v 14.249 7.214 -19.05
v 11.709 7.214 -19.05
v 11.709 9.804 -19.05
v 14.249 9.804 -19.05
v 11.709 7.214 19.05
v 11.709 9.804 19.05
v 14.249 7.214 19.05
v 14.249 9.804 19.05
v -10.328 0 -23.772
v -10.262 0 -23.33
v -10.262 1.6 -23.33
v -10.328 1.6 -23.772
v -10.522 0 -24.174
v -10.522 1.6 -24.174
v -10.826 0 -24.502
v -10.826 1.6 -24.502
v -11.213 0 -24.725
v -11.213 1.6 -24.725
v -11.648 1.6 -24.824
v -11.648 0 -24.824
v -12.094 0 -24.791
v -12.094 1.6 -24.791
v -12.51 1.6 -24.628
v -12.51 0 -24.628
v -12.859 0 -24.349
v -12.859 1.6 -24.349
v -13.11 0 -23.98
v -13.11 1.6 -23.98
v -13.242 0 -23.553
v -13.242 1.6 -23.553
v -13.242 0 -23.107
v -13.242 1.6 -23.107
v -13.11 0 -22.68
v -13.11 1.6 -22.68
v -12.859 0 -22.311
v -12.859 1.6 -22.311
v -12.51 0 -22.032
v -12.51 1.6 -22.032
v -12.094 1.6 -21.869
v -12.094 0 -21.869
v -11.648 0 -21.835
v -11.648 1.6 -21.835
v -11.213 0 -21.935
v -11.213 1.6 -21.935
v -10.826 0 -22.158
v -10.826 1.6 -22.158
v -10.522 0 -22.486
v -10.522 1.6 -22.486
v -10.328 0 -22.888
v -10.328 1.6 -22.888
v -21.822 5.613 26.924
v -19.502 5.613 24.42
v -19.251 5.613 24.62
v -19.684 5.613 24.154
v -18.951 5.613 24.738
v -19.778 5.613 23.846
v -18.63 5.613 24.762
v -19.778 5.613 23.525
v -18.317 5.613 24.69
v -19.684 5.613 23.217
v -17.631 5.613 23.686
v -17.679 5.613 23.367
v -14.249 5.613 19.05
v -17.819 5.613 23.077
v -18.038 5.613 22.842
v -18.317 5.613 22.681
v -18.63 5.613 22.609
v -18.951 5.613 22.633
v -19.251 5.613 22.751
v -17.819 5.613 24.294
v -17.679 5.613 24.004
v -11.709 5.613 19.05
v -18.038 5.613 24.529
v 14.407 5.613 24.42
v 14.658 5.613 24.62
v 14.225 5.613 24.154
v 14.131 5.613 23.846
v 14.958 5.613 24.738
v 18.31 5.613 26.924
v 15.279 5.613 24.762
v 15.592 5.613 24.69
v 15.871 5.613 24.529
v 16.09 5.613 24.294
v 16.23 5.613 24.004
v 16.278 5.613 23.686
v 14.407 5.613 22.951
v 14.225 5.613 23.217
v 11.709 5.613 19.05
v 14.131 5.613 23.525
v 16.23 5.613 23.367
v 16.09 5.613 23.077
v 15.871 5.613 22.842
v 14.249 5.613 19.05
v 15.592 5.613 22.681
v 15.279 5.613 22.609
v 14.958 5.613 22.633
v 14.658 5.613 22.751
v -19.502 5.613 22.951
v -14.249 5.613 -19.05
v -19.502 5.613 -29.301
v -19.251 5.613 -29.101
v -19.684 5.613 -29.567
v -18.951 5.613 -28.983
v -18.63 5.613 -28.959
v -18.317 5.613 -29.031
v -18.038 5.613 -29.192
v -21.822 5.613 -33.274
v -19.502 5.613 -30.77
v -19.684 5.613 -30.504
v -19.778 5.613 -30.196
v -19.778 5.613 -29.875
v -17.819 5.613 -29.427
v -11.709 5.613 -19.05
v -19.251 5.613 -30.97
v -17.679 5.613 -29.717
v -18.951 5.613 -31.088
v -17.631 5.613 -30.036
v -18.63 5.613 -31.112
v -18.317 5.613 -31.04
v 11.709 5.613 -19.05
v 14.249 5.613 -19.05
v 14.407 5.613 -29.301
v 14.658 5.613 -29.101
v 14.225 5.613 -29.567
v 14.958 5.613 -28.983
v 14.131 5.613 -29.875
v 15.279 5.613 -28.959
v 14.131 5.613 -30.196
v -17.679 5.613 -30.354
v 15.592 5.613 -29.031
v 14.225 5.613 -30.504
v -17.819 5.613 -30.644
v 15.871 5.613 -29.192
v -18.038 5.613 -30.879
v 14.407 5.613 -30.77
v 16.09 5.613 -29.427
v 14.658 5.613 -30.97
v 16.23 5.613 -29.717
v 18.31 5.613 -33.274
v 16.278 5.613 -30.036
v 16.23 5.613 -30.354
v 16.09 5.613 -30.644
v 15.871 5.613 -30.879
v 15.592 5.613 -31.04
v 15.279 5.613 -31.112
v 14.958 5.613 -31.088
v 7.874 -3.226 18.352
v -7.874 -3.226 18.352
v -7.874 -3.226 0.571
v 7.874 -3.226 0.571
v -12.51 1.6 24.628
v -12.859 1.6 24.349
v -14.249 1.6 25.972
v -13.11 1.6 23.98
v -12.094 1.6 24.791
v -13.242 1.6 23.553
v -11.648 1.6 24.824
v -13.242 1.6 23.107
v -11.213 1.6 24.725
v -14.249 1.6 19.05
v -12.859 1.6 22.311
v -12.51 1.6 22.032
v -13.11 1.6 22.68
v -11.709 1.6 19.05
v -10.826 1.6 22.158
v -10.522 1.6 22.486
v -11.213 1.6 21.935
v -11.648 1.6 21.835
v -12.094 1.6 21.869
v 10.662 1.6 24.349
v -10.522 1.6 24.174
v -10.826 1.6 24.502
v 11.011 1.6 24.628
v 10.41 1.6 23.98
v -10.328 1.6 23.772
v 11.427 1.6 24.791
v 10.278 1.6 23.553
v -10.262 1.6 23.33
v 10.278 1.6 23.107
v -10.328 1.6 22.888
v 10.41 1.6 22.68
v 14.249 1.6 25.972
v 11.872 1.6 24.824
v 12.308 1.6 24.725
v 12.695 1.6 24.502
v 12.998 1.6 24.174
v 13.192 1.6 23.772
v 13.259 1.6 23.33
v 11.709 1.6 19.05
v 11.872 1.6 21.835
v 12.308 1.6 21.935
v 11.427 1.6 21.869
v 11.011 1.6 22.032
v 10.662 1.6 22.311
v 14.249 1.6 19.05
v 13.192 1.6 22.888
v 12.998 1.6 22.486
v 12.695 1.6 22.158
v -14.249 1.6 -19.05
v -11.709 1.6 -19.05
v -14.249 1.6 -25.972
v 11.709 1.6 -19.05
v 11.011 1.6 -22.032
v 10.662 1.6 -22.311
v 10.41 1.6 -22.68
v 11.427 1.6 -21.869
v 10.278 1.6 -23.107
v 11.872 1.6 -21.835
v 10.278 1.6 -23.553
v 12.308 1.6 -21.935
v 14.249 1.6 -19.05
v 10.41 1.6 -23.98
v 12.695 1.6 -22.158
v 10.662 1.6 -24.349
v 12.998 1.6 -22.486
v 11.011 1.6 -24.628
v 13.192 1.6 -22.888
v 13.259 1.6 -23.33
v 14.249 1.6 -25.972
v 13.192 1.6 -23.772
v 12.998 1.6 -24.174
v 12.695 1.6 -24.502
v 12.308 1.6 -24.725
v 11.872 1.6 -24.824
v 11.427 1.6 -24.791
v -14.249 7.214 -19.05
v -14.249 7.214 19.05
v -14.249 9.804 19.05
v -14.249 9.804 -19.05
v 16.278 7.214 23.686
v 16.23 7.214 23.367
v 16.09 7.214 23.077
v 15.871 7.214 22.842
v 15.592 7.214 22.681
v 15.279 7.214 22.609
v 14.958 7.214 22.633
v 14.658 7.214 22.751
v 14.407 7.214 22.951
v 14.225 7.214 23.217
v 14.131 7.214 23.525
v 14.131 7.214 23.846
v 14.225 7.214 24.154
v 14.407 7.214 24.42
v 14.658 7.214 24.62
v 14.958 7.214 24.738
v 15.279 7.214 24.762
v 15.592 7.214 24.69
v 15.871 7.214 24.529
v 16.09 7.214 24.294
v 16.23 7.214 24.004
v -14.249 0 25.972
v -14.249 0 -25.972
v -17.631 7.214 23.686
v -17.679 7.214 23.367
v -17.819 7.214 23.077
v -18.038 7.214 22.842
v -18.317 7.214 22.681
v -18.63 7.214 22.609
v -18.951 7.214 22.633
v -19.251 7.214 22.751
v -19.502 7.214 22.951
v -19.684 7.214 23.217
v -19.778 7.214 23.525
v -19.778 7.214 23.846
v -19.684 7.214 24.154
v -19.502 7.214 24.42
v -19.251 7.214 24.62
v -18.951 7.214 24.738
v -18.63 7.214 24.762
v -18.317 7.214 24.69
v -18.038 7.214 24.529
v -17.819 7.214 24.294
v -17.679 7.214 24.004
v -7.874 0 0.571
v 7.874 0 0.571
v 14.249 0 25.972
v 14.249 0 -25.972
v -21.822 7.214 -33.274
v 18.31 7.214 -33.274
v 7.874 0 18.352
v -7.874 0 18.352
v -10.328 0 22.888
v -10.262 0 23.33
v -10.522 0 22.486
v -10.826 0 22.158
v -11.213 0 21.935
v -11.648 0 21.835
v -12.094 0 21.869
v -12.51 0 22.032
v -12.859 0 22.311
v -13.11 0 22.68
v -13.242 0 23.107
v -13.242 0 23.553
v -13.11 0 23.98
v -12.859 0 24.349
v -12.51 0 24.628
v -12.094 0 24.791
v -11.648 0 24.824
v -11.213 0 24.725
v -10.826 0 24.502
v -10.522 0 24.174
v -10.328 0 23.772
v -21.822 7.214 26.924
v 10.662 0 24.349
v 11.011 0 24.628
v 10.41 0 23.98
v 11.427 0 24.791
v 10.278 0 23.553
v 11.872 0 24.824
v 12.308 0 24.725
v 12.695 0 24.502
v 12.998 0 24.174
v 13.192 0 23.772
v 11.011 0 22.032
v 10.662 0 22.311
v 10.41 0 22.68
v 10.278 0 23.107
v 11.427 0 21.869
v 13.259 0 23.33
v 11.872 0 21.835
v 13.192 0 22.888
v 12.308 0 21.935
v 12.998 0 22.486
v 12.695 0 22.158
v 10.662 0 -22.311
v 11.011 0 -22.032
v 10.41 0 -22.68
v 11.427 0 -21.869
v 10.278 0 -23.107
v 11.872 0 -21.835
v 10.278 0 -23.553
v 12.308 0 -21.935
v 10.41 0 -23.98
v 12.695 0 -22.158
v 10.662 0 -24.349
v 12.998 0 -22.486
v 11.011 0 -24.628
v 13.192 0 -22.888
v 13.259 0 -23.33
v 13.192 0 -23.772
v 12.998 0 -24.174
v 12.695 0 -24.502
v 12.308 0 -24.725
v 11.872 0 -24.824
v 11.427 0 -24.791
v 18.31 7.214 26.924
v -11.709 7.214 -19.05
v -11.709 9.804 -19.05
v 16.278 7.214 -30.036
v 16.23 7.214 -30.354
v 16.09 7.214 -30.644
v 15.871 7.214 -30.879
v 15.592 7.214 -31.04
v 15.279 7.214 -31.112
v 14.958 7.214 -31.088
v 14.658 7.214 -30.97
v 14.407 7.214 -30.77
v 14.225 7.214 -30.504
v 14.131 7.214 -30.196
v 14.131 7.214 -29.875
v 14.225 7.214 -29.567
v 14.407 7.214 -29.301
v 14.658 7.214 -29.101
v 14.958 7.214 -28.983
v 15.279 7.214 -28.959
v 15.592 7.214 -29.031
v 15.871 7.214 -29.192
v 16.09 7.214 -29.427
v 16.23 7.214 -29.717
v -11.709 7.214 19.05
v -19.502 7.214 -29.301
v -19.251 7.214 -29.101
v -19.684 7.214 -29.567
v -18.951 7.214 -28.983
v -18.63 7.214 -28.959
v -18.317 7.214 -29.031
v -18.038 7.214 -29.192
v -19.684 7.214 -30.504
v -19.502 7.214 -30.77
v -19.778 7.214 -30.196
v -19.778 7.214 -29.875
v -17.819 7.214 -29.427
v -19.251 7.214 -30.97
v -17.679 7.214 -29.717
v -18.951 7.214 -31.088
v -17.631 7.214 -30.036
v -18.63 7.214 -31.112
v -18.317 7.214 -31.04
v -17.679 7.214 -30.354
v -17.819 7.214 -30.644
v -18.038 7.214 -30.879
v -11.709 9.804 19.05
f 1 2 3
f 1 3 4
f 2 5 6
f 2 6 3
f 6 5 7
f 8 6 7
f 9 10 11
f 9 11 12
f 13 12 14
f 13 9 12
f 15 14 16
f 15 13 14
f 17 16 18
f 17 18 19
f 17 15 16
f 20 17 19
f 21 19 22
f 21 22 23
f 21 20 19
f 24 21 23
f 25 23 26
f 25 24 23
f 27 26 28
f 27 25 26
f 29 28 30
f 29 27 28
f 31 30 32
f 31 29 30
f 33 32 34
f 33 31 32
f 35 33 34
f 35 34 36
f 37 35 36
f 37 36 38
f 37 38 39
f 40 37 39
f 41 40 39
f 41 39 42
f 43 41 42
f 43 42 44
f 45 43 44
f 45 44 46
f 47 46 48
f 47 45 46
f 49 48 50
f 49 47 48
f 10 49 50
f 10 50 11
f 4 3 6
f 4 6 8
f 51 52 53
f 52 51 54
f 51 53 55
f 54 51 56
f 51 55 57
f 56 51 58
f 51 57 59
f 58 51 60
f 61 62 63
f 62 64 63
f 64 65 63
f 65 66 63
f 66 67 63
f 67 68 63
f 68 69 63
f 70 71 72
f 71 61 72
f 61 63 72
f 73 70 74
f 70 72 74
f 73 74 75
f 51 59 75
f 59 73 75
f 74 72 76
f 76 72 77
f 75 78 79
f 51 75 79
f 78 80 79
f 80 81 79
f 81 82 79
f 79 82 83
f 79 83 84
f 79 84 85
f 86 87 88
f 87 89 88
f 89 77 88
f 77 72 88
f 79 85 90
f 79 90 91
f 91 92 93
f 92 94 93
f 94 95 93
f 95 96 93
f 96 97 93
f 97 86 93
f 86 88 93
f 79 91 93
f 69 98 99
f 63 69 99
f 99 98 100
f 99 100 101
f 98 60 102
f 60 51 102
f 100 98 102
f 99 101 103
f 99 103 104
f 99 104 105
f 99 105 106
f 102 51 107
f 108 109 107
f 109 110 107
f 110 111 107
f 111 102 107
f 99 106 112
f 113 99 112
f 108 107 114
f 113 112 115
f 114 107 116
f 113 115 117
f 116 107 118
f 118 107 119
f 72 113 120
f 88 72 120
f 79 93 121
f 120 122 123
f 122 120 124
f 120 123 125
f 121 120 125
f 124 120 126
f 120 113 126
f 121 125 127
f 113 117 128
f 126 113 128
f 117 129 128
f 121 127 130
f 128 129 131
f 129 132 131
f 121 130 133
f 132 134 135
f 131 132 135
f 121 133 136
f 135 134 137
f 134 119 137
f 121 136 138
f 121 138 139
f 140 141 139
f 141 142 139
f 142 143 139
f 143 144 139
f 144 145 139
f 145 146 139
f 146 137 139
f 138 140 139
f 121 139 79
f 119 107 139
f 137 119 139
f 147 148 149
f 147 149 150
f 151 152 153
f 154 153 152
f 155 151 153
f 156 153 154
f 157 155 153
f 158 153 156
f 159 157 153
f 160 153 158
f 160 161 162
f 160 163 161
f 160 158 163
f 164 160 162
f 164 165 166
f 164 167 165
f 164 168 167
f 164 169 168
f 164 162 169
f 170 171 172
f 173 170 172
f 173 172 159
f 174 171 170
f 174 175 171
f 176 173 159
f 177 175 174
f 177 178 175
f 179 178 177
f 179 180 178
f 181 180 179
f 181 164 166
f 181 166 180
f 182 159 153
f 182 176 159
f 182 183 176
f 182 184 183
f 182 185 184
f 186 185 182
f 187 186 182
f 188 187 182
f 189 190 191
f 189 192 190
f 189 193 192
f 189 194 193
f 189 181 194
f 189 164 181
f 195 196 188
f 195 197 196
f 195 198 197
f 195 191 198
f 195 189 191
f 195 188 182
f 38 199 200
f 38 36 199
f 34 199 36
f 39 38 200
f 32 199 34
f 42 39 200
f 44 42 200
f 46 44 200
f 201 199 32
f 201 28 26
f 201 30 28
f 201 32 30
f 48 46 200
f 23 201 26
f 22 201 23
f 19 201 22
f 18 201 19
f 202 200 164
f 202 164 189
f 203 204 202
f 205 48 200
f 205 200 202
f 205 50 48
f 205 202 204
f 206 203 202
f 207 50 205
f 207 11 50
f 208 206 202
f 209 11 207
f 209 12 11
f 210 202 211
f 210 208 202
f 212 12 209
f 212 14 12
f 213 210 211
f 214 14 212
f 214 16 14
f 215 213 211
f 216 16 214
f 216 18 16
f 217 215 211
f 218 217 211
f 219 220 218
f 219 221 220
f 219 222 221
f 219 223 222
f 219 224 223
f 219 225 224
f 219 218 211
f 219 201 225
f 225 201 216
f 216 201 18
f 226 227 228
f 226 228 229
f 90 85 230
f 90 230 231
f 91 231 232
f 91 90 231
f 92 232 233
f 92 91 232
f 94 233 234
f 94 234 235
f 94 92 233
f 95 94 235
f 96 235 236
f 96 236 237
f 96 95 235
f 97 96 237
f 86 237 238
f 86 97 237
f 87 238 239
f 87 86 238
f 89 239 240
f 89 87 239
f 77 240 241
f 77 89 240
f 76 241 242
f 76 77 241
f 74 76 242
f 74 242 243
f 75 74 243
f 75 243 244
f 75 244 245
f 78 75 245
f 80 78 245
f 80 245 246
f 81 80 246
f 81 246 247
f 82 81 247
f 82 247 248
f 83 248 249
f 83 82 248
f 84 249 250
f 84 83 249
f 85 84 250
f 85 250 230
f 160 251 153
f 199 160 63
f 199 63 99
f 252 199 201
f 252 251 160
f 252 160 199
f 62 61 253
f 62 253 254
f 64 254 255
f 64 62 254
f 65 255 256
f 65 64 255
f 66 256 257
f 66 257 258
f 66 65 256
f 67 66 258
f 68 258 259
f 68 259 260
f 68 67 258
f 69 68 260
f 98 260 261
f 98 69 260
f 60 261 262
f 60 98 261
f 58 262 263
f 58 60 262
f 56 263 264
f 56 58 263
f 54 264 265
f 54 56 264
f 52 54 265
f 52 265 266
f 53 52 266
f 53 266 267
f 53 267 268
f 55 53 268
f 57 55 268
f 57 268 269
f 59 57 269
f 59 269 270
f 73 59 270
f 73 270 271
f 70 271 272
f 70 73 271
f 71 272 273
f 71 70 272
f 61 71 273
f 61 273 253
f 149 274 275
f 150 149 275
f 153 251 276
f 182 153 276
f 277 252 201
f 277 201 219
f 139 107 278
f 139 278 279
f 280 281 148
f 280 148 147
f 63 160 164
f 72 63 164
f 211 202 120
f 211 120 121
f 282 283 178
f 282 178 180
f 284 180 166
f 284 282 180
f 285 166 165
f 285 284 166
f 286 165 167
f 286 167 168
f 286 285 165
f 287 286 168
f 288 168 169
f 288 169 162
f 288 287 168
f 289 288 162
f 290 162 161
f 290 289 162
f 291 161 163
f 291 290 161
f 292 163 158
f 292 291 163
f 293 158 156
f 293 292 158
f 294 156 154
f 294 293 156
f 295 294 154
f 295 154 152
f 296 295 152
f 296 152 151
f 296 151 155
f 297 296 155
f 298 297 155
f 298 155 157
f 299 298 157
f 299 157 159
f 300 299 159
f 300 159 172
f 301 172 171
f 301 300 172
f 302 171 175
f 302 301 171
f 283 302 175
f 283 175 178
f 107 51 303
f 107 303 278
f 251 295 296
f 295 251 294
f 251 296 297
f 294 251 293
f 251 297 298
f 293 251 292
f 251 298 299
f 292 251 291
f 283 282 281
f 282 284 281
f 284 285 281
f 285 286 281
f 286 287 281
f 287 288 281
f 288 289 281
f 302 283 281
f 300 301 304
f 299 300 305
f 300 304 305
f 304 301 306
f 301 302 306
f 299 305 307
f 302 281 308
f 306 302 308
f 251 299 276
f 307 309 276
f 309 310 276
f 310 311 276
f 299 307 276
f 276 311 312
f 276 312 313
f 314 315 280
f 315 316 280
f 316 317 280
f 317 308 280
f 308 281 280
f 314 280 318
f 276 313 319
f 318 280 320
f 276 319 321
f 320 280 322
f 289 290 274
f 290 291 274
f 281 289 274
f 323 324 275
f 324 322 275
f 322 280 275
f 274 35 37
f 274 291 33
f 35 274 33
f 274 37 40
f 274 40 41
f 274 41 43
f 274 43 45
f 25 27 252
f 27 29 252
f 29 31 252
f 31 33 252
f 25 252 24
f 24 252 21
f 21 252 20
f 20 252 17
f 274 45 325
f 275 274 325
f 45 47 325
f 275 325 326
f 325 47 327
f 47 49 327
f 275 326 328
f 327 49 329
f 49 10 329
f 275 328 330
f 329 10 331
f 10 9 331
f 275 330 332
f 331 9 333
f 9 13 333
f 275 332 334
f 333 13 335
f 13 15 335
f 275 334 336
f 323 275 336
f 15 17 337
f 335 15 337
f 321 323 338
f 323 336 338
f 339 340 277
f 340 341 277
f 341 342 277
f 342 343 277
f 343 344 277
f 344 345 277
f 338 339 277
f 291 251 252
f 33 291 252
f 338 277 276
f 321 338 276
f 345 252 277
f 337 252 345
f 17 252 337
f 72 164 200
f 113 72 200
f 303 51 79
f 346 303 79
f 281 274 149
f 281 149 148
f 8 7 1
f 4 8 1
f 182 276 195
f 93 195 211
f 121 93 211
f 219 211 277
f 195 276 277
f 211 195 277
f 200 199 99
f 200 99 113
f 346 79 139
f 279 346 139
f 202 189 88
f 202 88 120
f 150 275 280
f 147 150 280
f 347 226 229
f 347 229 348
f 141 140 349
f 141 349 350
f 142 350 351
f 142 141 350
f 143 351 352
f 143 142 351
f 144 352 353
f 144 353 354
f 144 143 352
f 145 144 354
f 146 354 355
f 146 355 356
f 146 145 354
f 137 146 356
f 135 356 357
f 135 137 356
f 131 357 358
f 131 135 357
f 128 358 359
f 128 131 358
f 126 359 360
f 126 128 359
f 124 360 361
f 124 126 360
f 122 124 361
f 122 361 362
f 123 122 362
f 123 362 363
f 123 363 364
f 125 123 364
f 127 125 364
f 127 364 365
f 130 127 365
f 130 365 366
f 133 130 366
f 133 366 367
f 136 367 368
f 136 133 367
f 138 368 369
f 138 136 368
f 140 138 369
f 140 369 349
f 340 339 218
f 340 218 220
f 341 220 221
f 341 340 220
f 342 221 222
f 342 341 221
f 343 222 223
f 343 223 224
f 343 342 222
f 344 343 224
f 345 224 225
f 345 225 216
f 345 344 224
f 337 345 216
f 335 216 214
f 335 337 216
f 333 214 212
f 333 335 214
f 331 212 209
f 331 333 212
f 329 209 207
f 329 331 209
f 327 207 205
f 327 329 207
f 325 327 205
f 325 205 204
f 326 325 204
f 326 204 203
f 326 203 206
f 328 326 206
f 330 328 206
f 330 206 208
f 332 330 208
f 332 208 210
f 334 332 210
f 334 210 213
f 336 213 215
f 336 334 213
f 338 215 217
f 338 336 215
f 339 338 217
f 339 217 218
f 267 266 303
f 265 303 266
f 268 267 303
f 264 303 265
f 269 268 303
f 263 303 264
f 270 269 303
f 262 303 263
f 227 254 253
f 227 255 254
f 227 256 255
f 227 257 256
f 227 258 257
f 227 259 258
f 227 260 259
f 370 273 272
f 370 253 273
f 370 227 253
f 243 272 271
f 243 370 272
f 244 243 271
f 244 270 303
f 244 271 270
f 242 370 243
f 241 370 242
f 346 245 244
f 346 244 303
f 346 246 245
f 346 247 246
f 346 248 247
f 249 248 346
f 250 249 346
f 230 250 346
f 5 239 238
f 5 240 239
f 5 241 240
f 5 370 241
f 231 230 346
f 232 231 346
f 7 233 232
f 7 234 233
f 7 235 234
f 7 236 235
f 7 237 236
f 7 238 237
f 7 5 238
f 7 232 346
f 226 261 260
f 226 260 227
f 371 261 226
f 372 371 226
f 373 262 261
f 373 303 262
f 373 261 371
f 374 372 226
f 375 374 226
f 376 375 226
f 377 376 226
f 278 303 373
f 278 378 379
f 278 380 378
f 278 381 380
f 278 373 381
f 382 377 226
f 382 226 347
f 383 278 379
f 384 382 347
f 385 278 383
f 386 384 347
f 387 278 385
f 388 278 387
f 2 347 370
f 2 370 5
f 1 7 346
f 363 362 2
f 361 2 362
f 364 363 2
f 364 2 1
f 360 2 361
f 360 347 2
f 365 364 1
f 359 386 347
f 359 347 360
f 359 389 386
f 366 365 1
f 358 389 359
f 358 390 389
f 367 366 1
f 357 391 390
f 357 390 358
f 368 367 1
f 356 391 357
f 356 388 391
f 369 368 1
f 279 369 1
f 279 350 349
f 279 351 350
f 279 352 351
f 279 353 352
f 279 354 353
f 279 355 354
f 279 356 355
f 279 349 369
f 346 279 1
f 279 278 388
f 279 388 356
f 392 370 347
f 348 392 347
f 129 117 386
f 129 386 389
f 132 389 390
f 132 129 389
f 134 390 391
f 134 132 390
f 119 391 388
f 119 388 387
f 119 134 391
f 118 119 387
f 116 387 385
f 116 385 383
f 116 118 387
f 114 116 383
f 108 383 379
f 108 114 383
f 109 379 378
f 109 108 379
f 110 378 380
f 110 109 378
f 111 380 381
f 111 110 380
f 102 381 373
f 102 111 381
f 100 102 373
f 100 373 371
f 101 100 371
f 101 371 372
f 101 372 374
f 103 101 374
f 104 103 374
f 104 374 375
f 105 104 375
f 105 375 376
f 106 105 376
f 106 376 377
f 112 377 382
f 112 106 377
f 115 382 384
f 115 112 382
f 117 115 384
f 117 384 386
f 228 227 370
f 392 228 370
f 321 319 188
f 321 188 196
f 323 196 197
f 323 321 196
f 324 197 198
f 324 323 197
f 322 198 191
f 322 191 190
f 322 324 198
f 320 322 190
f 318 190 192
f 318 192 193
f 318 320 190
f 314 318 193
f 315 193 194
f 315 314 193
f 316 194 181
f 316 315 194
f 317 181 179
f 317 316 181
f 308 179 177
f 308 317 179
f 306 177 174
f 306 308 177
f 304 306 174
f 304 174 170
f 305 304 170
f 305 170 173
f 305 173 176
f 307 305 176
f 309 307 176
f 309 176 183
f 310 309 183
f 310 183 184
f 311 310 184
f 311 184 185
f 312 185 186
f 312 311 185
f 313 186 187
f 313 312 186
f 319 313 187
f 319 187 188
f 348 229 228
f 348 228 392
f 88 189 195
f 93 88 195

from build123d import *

# Parameters (mm, degrees)
SKETCH1_W           = 28.4988
SKETCH1_H           = 51.943
SKETCH1_R           = 1.4986
BOSS_EXTRUDE1_DEPTH = 1.6002
SKETCH2_W           = 2.54
SKETCH2_H           = 38.1
BOSS_EXTRUDE2_DEPTH = 8.2042
SKETCH3_W           = 15.748
SKETCH3_H           = 17.78
BOSS_EXTRUDE3_DEPTH = 3.2258
SKETCH4_W           = 40.132
SKETCH4_H           = 60.198
SKETCH4_R           = 1.0795
BOSS_EXTRUDE4_DEPTH = 1.6002


with BuildPart() as part:
    # Sketch1 → Boss-Extrude1 (new body)
    with BuildSketch(Plane(origin=(0, 0, 0), x_dir=(1, 0, 0), z_dir=(0, 1, 0))):
        Rectangle(SKETCH1_W, SKETCH1_H)
        with Locations((-11.7602, 23.3299)):
            Circle(SKETCH1_R, mode=Mode.SUBTRACT)
        with Locations((11.7602, -23.3299)):
            Circle(SKETCH1_R, mode=Mode.SUBTRACT)
        with Locations((-11.7602, -23.3299)):
            Circle(SKETCH1_R, mode=Mode.SUBTRACT)
        with Locations((11.7602, 23.3299)):
            Circle(SKETCH1_R, mode=Mode.SUBTRACT)
    extrude(amount=BOSS_EXTRUDE1_DEPTH)

    # Sketch2 → Boss-Extrude2 (add)
    with BuildSketch(Plane(origin=(0, 1.6002, 0), x_dir=(1, 0, 0), z_dir=(0, 1, 0))):
        with Locations((-12.9794, 0)):
            Rectangle(SKETCH2_W, SKETCH2_H)
        with Locations((12.9794, 0)):
            Rectangle(SKETCH2_W, SKETCH2_H)
    extrude(amount=BOSS_EXTRUDE2_DEPTH)

    # Sketch3 → Boss-Extrude3 (add)
    with BuildSketch(Plane.XZ):
        with Locations((0, 9.4615)):
            Rectangle(SKETCH3_W, SKETCH3_H)
    extrude(amount=BOSS_EXTRUDE3_DEPTH)

    # Sketch4 → Boss-Extrude4 (add)
    with BuildSketch(Plane(origin=(0, 5.6134, 0), x_dir=(1, 0, 0), z_dir=(0, 1, 0))):
        with Locations((-1.756423699, 3.175)):
            Rectangle(SKETCH4_W, SKETCH4_H)
        with Locations((-18.710923699, 30.0355)):
            Circle(SKETCH4_R, mode=Mode.SUBTRACT)
        with Locations((15.198076301, 30.0355)):
            Circle(SKETCH4_R, mode=Mode.SUBTRACT)
        with Locations((15.198076301, -23.6855)):
            Circle(SKETCH4_R, mode=Mode.SUBTRACT)
        with Locations((-18.710923699, -23.6855)):
            Circle(SKETCH4_R, mode=Mode.SUBTRACT)
    extrude(amount=BOSS_EXTRUDE4_DEPTH)


solid = part.part
